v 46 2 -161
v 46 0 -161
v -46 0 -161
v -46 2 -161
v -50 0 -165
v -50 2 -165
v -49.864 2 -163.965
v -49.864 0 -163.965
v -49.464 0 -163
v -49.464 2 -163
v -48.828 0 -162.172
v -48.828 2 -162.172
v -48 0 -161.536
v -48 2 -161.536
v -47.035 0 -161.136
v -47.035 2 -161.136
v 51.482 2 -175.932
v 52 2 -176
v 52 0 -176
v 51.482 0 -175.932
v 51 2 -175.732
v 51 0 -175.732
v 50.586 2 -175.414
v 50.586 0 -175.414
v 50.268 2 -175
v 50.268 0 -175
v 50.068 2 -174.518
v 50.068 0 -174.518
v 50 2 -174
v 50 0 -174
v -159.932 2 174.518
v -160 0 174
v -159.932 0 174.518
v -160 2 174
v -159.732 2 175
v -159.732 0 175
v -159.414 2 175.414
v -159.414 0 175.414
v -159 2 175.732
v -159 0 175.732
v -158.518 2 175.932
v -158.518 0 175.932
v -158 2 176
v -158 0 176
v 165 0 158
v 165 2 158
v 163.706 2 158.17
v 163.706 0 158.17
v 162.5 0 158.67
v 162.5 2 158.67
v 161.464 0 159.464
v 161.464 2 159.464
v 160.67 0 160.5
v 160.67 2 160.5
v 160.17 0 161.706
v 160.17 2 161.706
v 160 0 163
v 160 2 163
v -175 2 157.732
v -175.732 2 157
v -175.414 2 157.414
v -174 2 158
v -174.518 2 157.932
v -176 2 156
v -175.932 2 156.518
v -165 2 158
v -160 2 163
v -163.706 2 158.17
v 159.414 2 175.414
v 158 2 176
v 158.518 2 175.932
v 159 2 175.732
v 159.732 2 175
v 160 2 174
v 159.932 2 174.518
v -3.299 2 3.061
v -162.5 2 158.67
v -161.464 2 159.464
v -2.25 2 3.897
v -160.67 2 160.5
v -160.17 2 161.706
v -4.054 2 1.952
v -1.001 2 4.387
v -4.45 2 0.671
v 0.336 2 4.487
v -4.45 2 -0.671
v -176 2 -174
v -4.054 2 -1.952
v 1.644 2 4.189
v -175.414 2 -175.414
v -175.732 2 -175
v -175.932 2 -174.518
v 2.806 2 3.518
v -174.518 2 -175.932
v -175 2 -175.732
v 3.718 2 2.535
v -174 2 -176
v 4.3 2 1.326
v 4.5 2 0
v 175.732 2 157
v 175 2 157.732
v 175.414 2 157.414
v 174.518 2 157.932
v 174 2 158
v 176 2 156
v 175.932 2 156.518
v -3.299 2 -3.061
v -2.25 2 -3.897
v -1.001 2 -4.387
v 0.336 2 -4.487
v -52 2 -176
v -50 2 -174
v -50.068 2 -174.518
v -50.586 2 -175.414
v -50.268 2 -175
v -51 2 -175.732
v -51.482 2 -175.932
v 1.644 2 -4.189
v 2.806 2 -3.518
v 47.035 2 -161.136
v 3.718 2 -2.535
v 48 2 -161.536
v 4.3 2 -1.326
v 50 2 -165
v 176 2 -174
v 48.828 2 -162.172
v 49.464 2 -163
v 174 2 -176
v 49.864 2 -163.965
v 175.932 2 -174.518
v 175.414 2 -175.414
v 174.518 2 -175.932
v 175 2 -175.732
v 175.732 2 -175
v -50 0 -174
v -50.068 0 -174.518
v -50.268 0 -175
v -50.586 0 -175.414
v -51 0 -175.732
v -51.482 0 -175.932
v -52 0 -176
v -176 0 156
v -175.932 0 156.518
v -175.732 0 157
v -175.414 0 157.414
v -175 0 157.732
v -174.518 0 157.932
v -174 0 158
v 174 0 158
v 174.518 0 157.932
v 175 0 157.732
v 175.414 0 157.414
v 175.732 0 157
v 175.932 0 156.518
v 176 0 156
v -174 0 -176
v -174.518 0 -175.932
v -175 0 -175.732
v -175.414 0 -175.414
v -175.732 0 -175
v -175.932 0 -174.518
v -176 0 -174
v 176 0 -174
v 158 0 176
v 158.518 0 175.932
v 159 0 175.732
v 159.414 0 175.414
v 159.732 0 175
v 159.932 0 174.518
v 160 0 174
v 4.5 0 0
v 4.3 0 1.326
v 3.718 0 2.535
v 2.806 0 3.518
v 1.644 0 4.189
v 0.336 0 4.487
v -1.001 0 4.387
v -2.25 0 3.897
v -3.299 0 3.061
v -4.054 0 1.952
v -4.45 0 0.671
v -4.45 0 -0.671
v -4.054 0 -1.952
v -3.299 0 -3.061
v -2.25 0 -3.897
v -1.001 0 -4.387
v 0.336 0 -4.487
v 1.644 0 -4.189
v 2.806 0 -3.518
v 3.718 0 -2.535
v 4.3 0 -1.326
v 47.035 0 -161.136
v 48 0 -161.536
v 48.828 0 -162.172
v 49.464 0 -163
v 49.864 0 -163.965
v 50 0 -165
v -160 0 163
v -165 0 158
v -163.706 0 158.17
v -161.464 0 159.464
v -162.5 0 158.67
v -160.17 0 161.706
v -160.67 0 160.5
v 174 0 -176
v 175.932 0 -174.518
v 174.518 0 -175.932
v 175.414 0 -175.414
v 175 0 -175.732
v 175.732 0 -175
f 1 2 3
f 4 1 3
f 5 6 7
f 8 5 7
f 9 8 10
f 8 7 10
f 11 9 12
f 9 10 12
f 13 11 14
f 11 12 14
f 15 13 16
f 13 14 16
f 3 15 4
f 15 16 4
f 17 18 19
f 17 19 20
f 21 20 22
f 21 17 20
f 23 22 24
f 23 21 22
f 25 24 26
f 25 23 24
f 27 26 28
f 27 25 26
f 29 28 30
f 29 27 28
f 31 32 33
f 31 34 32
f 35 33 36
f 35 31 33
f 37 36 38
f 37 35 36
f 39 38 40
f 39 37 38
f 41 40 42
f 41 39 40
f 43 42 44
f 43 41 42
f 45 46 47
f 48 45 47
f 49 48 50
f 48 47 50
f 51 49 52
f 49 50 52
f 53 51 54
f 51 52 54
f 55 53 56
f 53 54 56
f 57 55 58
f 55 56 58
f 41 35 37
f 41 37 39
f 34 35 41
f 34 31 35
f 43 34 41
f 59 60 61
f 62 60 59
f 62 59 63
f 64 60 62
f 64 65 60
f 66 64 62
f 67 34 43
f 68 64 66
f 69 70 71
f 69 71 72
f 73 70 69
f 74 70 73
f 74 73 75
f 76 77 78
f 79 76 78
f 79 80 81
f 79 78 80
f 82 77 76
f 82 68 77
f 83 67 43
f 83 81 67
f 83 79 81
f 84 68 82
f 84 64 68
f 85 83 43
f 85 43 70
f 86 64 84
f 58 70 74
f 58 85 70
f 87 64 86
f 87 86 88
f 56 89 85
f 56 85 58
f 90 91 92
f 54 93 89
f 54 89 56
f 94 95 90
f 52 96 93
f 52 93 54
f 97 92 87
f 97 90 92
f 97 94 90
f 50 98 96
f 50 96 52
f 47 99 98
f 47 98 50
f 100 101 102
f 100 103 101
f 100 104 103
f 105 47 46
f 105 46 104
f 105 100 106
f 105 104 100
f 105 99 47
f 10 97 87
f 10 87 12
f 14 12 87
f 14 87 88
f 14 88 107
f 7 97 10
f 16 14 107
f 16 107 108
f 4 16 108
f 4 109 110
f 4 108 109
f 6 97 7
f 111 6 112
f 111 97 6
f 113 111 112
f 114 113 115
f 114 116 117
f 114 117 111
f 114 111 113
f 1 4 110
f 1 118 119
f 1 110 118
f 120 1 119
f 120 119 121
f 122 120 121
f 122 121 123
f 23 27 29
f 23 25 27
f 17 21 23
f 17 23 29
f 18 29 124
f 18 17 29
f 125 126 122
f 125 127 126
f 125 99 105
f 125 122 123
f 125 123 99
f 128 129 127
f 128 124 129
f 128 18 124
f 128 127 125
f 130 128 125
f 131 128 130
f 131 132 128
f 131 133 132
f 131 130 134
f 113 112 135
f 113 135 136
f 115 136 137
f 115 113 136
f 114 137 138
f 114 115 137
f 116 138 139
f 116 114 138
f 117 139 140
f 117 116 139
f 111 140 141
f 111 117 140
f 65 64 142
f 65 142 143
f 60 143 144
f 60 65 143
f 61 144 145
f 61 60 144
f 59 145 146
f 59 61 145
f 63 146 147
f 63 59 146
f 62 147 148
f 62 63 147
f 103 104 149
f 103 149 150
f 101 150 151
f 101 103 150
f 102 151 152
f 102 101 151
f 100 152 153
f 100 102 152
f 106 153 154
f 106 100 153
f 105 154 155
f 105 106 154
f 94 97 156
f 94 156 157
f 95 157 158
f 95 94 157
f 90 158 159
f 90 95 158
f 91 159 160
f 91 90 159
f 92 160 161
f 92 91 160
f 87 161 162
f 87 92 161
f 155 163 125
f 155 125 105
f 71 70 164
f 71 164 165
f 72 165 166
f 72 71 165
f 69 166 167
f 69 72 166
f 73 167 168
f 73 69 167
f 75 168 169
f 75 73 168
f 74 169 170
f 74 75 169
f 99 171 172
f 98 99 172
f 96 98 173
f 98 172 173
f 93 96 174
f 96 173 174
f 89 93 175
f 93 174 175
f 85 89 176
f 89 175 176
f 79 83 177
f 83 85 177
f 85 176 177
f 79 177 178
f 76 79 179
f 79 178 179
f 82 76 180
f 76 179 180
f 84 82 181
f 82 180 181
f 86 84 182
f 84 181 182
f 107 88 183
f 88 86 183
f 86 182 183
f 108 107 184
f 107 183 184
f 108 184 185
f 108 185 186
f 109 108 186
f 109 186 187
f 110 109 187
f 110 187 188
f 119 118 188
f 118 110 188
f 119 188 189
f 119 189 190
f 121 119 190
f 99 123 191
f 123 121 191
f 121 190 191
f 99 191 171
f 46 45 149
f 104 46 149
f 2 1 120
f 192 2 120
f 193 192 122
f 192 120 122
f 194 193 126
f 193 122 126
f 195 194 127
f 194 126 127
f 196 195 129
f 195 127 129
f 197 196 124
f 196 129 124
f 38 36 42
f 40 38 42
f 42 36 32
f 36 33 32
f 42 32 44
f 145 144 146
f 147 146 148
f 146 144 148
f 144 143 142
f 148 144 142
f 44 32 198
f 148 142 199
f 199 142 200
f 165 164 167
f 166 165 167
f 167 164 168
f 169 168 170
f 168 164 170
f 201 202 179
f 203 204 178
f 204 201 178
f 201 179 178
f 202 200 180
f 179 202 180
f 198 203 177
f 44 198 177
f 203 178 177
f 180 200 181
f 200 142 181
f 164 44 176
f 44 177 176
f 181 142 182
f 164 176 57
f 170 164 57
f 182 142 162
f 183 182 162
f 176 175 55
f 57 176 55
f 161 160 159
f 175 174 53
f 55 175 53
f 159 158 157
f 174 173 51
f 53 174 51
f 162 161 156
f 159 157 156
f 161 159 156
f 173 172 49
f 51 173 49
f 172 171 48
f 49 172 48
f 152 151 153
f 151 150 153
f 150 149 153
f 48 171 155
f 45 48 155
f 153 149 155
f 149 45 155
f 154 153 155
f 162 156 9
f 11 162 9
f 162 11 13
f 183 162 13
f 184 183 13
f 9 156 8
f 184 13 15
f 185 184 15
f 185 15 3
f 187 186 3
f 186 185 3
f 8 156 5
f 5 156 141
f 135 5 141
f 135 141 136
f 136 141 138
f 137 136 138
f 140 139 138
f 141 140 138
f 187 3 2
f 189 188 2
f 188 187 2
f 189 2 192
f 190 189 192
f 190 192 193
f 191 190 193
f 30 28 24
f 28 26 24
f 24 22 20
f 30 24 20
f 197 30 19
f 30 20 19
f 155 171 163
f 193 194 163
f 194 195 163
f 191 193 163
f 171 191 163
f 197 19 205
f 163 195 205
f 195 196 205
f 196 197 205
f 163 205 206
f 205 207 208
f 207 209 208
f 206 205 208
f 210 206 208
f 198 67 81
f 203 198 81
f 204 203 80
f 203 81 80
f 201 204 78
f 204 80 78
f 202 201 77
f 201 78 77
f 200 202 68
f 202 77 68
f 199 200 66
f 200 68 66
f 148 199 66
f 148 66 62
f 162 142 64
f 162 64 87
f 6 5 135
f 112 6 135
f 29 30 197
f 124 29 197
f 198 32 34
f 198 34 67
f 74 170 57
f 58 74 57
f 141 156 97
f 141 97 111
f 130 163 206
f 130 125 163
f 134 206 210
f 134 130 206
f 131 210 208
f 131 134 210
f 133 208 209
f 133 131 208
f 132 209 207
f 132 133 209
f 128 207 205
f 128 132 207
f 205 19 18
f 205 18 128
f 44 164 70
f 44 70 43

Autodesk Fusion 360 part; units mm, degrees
sketch "base_sketch" plane through (0, 0, 0) normal (0, 1, 0) x (1, 0, 0) in component "bed"
  line L0 (176, -176) -> (-176, -176)
  line L1 (-176, -176) -> (-176, 176)
  line L2 (-176, 176) -> (176, 176)
  line L3 (176, 176) -> (176, -176)
  line L4 (176, -176) -> (-176, 176) construction
  line L5 (-176, -176) -> (176, 176) construction
  circle A0 centre (0, 0) radius 4.5
  line L6 (-176, -176) -> (-160, -176)
  line L7 (-160, -176) -> (-160, -158)
  line L8 (-160, -158) -> (-176, -158)
  line L9 (-176, -158) -> (-176, -176)
  line L10 (176, -176) -> (160, -176)
  line L11 (160, -176) -> (160, -158)
  line L12 (160, -158) -> (176, -158)
  line L13 (176, -158) -> (176, -176)
  line L14 (-50, 176) -> (50, 176)
  line L15 (50, 176) -> (50, 161)
  line L16 (50, 161) -> (-50, 161)
  line L17 (-50, 161) -> (-50, 176)
  line L18 (0, 176) -> (0, -176) construction
  dimension "d18" = 352
  dimension "d19" = 352
  dimension "d20" = 9
  dimension "d21" = 16
  dimension "d22" = 18
  dimension "d23" = 16
  dimension "d24" = 18
  dimension "d26" = 15
  dimension "d30" = 50
extrude "Extrude1" add sketch "base_sketch" along normal blind 2 contours L0 L1 L2 L3 L7 L8 L11 L12 L15 L16 L17 in component "bed"
fillet "Fillet1" radius 5 2 edges at (160, 1, 158) (-160, 1, 158) in component "bed"
fillet "Fillet2" radius 4 2 edges at (-50, 1, -161) (50, 1, -161) in component "bed"
fillet "Fillet3" radius 2 8 edges at (-176, 1, -176) (50, 1, -176) (-50, 1, -176) (176, 1, -176) (176, 1, 158) (160, 1, 176) (-160, 1, 176) (-176, 1, 158) in component "bed"
sketch "export_dxf" plane through (0, 2, 0) normal (0, 1, 0) x (-1, 0, 0) in component "bed"
  arc A0 (176, 156) -> (174, 158) centre (174, 156) ccw
  line L0 (174, 158) -> (165, 158)
  arc A1 (160, 163) -> (165, 158) centre (165, 163) ccw
  line L1 (160, 163) -> (160, 174)
  arc A2 (160, 174) -> (158, 176) centre (158, 174) ccw
  line L2 (158, 176) -> (-158, 176)
  arc A3 (-158, 176) -> (-160, 174) centre (-158, 174) ccw
  line L3 (-160, 174) -> (-160, 163)
  arc A4 (-165, 158) -> (-160, 163) centre (-165, 163) ccw
  line L4 (-165, 158) -> (-174, 158)
  arc A5 (-174, 158) -> (-176, 156) centre (-174, 156) ccw
  line L5 (-176, 156) -> (-176, -174)
  arc A6 (-176, -174) -> (-174, -176) centre (-174, -174) ccw
  line L6 (-174, -176) -> (-52, -176)
  arc A7 (-52, -176) -> (-50, -174) centre (-52, -174) ccw
  line L7 (-50, -174) -> (-50, -165)
  arc A8 (-46, -161) -> (-50, -165) centre (-46, -165) ccw
  line L8 (-46, -161) -> (46, -161)
  arc A9 (50, -165) -> (46, -161) centre (46, -165) ccw
  line L9 (50, -165) -> (50, -174)
  arc A10 (50, -174) -> (52, -176) centre (52, -174) ccw
  line L10 (52, -176) -> (174, -176)
  arc A11 (174, -176) -> (176, -174) centre (174, -174) ccw
  line L11 (176, -174) -> (176, 156)
  circle A12 centre (0, 0) radius 4.5
component "bed" placed x (1, 0, 0) y (0, 1, 0) z (0, 0, 1) at (0, 0, 0)
